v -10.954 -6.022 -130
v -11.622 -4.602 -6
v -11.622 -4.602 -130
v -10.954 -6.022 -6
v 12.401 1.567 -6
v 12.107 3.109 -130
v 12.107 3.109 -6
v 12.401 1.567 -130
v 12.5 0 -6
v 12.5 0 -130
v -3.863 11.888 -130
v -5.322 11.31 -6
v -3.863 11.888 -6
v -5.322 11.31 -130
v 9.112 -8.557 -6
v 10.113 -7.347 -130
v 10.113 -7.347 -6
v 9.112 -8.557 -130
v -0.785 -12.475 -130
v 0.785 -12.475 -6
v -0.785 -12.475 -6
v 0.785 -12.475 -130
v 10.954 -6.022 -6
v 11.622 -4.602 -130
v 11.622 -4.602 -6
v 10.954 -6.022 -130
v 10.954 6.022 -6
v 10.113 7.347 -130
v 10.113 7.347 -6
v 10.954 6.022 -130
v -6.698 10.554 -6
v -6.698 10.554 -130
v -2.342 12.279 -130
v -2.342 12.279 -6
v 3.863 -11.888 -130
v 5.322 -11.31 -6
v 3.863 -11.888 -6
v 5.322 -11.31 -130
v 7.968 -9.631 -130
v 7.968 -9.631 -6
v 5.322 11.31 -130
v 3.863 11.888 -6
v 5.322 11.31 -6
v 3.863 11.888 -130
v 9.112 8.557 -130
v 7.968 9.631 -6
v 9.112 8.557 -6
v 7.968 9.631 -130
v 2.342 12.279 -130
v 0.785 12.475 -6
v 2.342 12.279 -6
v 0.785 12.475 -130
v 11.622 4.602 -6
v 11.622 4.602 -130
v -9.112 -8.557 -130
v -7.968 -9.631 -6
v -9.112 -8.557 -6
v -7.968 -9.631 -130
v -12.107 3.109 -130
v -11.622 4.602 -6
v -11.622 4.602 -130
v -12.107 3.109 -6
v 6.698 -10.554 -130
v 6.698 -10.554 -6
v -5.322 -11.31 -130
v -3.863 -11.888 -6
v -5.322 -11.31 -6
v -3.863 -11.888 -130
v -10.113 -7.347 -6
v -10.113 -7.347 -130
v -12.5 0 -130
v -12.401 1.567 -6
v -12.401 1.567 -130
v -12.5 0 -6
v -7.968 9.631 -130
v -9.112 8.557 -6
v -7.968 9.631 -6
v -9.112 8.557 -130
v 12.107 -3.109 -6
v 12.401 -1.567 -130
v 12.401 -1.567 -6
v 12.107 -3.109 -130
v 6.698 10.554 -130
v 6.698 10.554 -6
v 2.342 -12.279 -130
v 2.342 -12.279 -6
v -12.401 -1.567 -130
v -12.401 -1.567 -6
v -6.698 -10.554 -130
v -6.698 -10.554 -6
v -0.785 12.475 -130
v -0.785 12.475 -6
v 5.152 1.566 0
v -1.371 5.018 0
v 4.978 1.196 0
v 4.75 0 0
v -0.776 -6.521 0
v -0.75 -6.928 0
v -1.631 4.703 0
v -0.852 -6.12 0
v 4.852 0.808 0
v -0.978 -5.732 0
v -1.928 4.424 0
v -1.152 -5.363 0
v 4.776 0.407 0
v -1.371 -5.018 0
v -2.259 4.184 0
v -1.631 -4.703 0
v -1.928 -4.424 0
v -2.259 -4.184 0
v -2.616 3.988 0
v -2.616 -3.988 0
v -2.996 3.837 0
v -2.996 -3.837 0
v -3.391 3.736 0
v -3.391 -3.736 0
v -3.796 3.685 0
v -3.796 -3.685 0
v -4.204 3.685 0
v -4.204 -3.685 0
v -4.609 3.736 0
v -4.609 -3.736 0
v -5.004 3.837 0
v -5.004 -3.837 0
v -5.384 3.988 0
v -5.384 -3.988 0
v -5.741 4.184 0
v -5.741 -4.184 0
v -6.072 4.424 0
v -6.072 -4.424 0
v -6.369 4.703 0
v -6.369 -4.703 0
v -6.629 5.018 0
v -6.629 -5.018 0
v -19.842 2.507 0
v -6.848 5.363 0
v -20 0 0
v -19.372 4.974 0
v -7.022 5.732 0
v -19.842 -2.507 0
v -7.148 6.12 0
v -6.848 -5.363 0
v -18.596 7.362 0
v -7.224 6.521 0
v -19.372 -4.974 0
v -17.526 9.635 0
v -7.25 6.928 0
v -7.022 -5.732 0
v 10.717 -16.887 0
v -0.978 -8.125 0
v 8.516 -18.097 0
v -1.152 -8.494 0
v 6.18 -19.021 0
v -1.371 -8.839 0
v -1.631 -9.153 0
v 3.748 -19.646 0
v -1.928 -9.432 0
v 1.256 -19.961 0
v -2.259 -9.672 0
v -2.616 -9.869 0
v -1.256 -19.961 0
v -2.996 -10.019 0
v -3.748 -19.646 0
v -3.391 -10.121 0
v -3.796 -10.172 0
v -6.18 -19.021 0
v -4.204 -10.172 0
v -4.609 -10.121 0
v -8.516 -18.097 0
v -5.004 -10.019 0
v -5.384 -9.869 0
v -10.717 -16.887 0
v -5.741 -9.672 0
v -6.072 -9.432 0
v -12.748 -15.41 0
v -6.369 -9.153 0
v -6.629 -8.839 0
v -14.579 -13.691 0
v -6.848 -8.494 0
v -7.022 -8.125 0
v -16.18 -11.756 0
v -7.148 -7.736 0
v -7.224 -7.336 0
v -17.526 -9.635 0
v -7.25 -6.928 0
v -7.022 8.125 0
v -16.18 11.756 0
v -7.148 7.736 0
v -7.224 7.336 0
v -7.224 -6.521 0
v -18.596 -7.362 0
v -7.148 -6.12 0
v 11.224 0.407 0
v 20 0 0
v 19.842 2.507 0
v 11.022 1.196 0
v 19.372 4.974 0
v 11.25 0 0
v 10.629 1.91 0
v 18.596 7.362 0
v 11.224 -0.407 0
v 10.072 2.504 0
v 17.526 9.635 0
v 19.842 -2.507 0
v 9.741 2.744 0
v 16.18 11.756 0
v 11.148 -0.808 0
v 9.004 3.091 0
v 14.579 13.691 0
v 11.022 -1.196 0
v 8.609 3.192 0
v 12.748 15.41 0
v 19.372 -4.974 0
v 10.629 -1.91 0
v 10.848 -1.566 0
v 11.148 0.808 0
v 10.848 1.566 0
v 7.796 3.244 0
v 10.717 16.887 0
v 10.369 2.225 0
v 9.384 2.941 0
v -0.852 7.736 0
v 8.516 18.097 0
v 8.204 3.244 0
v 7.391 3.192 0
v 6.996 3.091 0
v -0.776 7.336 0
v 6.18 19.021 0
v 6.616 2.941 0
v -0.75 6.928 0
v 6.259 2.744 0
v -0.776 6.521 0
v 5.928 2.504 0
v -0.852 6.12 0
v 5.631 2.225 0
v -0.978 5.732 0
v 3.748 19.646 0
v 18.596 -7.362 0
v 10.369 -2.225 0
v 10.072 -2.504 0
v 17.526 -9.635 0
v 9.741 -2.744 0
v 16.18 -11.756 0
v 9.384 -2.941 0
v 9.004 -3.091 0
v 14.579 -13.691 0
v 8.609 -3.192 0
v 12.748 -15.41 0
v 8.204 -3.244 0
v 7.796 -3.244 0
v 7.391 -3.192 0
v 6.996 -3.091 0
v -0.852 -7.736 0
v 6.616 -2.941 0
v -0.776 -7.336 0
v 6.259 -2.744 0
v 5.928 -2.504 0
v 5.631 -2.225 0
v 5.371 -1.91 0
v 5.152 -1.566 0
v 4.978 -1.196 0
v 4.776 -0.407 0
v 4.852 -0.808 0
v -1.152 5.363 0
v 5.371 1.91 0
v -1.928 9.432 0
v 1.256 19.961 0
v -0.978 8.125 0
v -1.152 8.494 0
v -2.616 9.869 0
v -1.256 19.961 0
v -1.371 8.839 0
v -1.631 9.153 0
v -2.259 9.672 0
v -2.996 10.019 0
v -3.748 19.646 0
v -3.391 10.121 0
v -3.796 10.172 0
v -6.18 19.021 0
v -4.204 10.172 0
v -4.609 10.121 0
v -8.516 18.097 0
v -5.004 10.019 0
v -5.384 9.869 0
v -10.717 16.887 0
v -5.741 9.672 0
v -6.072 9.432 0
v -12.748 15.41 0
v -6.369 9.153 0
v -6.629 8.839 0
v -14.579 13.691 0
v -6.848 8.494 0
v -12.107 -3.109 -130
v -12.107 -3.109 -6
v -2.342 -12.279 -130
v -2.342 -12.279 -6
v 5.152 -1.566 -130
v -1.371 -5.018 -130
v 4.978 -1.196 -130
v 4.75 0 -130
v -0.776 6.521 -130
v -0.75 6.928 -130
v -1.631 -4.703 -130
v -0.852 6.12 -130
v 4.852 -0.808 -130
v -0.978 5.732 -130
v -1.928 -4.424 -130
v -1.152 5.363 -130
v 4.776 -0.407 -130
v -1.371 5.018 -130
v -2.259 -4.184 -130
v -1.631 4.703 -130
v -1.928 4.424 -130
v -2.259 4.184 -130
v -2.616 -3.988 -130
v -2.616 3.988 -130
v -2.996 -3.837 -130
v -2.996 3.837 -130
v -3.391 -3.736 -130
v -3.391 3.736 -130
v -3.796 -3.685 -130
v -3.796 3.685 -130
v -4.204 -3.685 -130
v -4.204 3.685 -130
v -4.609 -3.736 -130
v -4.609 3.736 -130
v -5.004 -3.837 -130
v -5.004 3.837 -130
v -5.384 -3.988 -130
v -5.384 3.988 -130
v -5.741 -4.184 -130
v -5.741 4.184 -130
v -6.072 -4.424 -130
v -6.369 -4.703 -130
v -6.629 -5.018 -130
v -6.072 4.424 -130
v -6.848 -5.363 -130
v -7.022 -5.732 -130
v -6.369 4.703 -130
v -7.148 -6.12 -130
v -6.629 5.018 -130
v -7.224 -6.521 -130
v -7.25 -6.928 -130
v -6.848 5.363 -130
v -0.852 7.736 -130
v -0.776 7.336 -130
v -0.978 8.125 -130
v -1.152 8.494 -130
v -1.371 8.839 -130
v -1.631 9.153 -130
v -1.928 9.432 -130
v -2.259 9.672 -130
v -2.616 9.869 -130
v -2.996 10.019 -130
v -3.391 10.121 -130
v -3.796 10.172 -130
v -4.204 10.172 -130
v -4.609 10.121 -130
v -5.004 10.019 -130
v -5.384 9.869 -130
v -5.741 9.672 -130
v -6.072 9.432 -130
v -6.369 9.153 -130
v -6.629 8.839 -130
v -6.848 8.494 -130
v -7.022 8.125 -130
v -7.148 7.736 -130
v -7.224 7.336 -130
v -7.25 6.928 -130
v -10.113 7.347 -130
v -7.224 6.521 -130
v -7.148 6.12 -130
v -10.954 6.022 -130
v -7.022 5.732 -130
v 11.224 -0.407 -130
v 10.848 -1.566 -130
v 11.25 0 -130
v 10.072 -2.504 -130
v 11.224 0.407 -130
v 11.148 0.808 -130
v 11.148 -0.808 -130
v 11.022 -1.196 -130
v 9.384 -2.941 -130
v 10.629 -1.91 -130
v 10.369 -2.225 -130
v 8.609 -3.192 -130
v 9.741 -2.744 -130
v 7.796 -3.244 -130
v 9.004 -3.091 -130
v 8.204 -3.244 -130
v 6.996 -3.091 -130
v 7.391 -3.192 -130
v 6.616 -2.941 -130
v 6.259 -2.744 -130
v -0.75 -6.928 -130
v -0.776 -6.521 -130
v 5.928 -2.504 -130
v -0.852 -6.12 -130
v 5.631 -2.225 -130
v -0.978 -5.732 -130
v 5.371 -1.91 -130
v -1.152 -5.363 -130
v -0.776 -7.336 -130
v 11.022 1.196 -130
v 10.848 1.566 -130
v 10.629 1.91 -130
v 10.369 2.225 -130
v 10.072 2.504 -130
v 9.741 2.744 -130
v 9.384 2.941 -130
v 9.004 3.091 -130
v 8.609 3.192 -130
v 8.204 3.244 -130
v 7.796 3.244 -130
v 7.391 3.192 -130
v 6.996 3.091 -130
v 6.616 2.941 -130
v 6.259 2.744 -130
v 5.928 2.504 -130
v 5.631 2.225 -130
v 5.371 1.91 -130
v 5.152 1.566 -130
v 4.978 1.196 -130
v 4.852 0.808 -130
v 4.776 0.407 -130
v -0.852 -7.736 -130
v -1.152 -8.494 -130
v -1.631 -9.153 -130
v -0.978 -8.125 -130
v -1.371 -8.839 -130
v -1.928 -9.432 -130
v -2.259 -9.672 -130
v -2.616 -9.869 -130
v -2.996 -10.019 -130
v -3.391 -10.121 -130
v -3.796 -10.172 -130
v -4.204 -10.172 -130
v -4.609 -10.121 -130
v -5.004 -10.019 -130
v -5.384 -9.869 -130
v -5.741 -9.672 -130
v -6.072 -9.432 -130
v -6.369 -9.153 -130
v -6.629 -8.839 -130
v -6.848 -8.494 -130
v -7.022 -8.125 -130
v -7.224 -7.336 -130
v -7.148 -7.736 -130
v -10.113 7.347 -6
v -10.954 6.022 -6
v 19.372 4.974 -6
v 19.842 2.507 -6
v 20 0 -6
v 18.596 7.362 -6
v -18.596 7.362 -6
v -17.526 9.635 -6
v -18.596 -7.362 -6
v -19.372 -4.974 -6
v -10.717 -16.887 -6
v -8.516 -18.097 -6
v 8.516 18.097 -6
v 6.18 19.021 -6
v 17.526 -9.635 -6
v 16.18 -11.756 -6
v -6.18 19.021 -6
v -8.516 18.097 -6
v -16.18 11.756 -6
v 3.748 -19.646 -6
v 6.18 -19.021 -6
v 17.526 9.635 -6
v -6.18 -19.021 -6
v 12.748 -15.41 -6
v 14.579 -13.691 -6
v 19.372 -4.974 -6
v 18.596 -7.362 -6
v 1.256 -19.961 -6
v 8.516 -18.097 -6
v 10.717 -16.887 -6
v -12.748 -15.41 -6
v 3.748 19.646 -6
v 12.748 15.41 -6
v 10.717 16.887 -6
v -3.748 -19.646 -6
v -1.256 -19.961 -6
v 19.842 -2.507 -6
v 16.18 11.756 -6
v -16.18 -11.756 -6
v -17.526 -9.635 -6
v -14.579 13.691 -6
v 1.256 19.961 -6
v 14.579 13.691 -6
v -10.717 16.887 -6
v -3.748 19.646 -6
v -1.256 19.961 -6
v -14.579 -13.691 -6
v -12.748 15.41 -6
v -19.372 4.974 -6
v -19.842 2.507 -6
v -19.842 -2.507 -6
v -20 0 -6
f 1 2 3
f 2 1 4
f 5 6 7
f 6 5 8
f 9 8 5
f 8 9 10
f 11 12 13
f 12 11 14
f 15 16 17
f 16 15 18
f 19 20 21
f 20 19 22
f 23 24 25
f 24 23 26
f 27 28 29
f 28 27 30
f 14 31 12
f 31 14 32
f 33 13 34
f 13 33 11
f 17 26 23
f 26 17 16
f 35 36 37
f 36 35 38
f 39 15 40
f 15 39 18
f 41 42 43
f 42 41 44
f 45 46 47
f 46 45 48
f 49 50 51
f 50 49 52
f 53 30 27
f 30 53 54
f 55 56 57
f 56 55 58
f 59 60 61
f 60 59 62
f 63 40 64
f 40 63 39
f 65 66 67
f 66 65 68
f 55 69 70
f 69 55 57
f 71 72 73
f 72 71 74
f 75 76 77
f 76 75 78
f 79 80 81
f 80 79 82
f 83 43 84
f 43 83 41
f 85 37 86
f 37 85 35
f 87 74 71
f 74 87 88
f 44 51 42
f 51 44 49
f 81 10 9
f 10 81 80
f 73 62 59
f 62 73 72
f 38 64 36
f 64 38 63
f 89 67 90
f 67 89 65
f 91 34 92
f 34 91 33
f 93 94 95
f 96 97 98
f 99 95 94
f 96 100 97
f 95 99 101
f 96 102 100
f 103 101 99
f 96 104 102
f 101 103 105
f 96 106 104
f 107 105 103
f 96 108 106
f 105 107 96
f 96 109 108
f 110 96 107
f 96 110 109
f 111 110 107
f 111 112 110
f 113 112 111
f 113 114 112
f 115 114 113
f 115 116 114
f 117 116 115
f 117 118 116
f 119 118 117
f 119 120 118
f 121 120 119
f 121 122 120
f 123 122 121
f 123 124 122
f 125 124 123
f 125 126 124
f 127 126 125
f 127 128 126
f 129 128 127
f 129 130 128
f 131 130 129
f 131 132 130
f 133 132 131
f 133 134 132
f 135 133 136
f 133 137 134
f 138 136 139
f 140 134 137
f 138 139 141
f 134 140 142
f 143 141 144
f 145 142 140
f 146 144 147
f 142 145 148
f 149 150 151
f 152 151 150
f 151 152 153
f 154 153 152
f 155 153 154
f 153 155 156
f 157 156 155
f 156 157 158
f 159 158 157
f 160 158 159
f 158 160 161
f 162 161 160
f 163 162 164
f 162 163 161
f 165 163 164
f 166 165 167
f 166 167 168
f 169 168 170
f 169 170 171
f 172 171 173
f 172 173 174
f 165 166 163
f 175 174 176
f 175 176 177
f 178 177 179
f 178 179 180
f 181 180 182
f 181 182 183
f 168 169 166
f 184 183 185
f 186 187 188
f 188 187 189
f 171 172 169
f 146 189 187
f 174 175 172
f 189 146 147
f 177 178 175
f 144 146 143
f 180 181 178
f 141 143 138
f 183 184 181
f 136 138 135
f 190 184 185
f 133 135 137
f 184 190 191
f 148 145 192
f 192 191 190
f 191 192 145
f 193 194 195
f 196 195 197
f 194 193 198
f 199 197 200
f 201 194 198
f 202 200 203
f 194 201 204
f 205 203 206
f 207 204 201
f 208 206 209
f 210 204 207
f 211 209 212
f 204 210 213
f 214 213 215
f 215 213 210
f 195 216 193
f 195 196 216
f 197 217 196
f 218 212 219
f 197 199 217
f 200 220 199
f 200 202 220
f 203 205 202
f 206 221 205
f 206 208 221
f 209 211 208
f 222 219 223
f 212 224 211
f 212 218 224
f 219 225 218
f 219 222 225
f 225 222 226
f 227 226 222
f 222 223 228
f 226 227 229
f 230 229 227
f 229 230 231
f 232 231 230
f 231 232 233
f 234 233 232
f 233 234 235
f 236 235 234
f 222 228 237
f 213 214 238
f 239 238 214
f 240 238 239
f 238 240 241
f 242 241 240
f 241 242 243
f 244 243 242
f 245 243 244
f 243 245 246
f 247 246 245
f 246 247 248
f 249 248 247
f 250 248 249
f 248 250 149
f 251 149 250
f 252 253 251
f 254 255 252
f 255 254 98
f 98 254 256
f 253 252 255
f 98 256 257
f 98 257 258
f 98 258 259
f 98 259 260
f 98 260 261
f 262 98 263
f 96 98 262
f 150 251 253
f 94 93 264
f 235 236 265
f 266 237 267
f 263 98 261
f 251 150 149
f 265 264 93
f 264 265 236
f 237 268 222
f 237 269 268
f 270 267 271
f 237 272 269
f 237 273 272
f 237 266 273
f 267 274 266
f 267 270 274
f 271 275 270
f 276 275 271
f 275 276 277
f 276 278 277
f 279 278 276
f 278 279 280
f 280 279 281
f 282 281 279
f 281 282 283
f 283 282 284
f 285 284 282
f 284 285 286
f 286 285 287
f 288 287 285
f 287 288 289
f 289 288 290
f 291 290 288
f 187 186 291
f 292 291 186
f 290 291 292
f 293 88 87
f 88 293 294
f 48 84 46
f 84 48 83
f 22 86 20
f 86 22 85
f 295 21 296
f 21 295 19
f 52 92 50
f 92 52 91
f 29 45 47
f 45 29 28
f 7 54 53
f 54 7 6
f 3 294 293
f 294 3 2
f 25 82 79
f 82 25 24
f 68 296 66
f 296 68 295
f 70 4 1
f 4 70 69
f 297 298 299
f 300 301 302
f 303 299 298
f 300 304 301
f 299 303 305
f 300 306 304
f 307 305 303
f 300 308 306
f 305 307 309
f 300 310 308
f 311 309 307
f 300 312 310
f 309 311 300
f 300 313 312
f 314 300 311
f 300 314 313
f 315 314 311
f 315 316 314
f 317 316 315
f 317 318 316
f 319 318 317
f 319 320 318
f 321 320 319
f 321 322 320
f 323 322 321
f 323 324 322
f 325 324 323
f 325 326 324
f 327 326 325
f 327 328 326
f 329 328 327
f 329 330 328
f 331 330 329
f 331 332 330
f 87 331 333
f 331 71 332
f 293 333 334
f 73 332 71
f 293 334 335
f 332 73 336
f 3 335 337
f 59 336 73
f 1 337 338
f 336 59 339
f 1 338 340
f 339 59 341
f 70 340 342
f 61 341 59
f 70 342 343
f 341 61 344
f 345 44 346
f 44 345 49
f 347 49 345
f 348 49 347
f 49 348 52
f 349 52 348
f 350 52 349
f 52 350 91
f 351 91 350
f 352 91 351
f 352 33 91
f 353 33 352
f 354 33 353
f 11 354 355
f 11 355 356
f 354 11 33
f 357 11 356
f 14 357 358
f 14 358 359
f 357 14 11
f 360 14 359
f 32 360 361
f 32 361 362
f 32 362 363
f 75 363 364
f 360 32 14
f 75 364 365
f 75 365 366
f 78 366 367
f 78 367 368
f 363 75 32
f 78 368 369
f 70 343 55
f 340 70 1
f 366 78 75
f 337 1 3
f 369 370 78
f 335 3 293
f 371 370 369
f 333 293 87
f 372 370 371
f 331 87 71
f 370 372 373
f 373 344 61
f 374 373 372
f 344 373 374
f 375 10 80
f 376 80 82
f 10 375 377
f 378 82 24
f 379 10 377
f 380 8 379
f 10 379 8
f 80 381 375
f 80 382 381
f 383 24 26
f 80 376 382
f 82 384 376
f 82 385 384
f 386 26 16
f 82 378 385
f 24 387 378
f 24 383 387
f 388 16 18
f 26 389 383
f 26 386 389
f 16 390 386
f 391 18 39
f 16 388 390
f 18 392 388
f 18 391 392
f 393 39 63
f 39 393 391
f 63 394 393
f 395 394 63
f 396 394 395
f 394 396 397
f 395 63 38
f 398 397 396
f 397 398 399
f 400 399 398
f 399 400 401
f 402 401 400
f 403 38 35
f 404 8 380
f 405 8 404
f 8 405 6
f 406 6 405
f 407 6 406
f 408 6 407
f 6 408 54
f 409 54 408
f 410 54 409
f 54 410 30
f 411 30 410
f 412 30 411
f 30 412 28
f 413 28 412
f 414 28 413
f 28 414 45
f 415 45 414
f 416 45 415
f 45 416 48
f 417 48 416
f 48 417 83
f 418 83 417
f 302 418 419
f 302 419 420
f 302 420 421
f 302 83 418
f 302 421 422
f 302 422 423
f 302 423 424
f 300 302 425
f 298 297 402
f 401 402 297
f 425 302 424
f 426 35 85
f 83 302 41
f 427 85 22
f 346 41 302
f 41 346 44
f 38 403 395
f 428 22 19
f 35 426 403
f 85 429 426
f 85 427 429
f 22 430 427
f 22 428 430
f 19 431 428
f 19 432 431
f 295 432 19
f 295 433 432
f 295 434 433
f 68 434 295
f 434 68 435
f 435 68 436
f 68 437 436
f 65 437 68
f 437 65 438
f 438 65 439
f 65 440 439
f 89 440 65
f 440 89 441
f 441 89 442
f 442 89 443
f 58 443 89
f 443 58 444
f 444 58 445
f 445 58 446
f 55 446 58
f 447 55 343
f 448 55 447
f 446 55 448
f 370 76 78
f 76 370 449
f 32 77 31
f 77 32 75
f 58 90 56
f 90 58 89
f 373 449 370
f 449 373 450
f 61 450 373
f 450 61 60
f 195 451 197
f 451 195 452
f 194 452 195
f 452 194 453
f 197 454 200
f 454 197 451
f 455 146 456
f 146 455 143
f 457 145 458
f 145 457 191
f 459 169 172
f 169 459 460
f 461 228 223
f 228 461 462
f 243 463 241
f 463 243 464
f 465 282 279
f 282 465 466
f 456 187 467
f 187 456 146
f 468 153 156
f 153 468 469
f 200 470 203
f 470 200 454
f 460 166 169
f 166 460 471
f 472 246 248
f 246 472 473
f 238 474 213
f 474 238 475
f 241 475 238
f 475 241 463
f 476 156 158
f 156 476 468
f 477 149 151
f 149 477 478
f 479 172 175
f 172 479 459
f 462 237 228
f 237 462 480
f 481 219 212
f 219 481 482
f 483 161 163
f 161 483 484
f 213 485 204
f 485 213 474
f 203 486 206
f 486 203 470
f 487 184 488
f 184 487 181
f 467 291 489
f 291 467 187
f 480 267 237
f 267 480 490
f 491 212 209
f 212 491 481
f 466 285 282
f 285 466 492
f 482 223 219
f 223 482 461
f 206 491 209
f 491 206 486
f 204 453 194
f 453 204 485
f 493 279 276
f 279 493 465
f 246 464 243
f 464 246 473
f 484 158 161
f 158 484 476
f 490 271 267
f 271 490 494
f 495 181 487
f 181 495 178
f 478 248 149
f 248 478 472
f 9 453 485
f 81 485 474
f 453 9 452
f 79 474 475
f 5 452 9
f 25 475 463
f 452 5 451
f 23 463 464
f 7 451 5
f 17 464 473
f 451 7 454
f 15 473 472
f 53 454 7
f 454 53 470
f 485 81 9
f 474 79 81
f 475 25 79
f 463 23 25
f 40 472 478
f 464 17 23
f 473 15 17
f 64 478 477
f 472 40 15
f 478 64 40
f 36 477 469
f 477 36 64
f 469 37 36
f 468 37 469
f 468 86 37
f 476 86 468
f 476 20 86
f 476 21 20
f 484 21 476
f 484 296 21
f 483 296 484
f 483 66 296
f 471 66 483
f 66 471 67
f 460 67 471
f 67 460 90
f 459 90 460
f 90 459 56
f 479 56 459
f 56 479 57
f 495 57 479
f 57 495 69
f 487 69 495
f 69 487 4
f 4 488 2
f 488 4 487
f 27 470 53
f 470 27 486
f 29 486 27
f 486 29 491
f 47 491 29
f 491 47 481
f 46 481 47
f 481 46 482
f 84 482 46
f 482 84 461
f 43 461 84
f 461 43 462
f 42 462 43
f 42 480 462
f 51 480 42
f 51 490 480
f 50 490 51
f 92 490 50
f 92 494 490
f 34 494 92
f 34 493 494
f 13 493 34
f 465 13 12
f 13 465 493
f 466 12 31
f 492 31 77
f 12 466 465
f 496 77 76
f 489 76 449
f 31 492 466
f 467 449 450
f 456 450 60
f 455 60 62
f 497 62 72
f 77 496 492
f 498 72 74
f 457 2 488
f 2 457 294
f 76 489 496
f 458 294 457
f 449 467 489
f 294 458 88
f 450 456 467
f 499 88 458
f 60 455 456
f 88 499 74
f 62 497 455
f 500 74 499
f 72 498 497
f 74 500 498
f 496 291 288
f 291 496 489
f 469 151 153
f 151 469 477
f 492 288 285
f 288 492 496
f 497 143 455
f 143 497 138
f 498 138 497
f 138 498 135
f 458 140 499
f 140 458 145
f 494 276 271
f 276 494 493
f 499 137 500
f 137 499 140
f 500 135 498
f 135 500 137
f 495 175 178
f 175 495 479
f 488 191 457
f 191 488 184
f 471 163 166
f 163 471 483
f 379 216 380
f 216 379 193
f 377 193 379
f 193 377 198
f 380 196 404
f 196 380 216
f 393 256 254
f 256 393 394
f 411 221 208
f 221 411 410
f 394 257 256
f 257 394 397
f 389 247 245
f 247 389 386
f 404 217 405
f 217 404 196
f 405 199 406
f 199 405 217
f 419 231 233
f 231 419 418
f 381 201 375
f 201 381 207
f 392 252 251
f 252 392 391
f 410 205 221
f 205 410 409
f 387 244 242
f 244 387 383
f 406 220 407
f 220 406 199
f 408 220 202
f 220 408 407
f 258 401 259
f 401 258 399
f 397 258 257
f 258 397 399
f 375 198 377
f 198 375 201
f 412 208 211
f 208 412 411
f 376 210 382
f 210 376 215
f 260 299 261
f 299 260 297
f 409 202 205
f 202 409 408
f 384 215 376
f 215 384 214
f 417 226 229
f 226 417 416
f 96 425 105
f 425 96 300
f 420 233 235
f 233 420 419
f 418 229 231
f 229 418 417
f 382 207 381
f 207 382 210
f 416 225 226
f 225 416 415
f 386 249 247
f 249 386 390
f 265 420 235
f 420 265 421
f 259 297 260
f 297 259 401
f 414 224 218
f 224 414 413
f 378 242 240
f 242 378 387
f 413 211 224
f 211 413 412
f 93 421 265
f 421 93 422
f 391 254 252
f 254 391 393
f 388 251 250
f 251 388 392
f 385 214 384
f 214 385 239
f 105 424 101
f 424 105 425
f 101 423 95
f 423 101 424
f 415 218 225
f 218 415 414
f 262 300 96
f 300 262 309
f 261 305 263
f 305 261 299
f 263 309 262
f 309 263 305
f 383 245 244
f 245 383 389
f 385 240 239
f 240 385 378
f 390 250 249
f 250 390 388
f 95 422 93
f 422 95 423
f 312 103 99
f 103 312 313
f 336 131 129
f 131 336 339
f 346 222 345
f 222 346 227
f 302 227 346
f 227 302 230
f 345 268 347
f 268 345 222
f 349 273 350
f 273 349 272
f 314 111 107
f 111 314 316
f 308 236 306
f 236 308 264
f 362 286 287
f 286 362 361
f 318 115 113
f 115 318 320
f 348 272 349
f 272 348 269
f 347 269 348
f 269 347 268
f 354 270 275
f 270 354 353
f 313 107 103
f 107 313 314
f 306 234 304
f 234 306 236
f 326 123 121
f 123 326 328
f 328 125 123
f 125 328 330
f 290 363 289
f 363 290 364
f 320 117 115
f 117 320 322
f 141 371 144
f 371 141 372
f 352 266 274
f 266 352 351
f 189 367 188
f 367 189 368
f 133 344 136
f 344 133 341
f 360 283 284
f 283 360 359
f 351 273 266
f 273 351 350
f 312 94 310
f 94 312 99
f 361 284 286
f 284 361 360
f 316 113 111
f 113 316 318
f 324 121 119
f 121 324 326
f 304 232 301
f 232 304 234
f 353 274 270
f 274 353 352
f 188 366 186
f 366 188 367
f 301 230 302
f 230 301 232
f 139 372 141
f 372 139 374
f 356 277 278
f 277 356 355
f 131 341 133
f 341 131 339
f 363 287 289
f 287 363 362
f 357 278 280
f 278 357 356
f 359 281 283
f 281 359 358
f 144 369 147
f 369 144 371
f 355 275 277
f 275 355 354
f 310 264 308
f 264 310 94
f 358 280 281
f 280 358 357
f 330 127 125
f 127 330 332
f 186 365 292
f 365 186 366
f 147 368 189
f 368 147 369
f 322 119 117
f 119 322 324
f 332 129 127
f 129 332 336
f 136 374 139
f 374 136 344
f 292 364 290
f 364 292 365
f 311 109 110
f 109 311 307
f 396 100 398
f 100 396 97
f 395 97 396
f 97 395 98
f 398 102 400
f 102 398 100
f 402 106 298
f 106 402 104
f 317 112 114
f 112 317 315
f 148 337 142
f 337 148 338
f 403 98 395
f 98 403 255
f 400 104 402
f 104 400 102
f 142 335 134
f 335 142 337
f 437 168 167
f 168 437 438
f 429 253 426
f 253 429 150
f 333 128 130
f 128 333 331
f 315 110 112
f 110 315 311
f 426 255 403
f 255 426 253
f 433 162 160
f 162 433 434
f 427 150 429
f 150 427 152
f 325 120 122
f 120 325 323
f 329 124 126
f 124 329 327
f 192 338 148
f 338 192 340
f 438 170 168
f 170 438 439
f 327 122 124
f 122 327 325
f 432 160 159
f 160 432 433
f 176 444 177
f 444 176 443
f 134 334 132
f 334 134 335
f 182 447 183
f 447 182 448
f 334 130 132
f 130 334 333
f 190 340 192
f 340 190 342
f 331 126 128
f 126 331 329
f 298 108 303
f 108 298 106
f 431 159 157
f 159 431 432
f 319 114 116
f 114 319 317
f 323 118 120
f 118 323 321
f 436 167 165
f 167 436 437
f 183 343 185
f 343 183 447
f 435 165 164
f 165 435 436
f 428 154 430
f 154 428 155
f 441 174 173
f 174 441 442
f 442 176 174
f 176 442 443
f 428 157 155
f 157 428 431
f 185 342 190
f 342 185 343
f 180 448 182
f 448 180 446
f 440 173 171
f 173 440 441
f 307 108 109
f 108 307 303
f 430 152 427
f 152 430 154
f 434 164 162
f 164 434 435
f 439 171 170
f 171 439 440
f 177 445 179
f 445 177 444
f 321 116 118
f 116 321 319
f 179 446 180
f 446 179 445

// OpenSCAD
$fn = 50;


difference() {
	union() {
		translate(v = [0, 0, -130.0000000000]) {
			cylinder(h = 130, r = 12.5000000000);
		}
		translate(v = [0, 0, -6.0000000000]) {
			cylinder(h = 6, r = 20.0000000000);
		}
	}
	union() {
		#translate(v = [8.0000000000, 0.0000000000, -130]) {
			cylinder(h = 130, r = 3.2500000000);
		}
		#translate(v = [-4.0000000000, 6.9282032303, -130]) {
			cylinder(h = 130, r = 3.2500000000);
		}
		#translate(v = [-4.0000000000, -6.9282032303, -130]) {
			cylinder(h = 130, r = 3.2500000000);
		}
	}
}
